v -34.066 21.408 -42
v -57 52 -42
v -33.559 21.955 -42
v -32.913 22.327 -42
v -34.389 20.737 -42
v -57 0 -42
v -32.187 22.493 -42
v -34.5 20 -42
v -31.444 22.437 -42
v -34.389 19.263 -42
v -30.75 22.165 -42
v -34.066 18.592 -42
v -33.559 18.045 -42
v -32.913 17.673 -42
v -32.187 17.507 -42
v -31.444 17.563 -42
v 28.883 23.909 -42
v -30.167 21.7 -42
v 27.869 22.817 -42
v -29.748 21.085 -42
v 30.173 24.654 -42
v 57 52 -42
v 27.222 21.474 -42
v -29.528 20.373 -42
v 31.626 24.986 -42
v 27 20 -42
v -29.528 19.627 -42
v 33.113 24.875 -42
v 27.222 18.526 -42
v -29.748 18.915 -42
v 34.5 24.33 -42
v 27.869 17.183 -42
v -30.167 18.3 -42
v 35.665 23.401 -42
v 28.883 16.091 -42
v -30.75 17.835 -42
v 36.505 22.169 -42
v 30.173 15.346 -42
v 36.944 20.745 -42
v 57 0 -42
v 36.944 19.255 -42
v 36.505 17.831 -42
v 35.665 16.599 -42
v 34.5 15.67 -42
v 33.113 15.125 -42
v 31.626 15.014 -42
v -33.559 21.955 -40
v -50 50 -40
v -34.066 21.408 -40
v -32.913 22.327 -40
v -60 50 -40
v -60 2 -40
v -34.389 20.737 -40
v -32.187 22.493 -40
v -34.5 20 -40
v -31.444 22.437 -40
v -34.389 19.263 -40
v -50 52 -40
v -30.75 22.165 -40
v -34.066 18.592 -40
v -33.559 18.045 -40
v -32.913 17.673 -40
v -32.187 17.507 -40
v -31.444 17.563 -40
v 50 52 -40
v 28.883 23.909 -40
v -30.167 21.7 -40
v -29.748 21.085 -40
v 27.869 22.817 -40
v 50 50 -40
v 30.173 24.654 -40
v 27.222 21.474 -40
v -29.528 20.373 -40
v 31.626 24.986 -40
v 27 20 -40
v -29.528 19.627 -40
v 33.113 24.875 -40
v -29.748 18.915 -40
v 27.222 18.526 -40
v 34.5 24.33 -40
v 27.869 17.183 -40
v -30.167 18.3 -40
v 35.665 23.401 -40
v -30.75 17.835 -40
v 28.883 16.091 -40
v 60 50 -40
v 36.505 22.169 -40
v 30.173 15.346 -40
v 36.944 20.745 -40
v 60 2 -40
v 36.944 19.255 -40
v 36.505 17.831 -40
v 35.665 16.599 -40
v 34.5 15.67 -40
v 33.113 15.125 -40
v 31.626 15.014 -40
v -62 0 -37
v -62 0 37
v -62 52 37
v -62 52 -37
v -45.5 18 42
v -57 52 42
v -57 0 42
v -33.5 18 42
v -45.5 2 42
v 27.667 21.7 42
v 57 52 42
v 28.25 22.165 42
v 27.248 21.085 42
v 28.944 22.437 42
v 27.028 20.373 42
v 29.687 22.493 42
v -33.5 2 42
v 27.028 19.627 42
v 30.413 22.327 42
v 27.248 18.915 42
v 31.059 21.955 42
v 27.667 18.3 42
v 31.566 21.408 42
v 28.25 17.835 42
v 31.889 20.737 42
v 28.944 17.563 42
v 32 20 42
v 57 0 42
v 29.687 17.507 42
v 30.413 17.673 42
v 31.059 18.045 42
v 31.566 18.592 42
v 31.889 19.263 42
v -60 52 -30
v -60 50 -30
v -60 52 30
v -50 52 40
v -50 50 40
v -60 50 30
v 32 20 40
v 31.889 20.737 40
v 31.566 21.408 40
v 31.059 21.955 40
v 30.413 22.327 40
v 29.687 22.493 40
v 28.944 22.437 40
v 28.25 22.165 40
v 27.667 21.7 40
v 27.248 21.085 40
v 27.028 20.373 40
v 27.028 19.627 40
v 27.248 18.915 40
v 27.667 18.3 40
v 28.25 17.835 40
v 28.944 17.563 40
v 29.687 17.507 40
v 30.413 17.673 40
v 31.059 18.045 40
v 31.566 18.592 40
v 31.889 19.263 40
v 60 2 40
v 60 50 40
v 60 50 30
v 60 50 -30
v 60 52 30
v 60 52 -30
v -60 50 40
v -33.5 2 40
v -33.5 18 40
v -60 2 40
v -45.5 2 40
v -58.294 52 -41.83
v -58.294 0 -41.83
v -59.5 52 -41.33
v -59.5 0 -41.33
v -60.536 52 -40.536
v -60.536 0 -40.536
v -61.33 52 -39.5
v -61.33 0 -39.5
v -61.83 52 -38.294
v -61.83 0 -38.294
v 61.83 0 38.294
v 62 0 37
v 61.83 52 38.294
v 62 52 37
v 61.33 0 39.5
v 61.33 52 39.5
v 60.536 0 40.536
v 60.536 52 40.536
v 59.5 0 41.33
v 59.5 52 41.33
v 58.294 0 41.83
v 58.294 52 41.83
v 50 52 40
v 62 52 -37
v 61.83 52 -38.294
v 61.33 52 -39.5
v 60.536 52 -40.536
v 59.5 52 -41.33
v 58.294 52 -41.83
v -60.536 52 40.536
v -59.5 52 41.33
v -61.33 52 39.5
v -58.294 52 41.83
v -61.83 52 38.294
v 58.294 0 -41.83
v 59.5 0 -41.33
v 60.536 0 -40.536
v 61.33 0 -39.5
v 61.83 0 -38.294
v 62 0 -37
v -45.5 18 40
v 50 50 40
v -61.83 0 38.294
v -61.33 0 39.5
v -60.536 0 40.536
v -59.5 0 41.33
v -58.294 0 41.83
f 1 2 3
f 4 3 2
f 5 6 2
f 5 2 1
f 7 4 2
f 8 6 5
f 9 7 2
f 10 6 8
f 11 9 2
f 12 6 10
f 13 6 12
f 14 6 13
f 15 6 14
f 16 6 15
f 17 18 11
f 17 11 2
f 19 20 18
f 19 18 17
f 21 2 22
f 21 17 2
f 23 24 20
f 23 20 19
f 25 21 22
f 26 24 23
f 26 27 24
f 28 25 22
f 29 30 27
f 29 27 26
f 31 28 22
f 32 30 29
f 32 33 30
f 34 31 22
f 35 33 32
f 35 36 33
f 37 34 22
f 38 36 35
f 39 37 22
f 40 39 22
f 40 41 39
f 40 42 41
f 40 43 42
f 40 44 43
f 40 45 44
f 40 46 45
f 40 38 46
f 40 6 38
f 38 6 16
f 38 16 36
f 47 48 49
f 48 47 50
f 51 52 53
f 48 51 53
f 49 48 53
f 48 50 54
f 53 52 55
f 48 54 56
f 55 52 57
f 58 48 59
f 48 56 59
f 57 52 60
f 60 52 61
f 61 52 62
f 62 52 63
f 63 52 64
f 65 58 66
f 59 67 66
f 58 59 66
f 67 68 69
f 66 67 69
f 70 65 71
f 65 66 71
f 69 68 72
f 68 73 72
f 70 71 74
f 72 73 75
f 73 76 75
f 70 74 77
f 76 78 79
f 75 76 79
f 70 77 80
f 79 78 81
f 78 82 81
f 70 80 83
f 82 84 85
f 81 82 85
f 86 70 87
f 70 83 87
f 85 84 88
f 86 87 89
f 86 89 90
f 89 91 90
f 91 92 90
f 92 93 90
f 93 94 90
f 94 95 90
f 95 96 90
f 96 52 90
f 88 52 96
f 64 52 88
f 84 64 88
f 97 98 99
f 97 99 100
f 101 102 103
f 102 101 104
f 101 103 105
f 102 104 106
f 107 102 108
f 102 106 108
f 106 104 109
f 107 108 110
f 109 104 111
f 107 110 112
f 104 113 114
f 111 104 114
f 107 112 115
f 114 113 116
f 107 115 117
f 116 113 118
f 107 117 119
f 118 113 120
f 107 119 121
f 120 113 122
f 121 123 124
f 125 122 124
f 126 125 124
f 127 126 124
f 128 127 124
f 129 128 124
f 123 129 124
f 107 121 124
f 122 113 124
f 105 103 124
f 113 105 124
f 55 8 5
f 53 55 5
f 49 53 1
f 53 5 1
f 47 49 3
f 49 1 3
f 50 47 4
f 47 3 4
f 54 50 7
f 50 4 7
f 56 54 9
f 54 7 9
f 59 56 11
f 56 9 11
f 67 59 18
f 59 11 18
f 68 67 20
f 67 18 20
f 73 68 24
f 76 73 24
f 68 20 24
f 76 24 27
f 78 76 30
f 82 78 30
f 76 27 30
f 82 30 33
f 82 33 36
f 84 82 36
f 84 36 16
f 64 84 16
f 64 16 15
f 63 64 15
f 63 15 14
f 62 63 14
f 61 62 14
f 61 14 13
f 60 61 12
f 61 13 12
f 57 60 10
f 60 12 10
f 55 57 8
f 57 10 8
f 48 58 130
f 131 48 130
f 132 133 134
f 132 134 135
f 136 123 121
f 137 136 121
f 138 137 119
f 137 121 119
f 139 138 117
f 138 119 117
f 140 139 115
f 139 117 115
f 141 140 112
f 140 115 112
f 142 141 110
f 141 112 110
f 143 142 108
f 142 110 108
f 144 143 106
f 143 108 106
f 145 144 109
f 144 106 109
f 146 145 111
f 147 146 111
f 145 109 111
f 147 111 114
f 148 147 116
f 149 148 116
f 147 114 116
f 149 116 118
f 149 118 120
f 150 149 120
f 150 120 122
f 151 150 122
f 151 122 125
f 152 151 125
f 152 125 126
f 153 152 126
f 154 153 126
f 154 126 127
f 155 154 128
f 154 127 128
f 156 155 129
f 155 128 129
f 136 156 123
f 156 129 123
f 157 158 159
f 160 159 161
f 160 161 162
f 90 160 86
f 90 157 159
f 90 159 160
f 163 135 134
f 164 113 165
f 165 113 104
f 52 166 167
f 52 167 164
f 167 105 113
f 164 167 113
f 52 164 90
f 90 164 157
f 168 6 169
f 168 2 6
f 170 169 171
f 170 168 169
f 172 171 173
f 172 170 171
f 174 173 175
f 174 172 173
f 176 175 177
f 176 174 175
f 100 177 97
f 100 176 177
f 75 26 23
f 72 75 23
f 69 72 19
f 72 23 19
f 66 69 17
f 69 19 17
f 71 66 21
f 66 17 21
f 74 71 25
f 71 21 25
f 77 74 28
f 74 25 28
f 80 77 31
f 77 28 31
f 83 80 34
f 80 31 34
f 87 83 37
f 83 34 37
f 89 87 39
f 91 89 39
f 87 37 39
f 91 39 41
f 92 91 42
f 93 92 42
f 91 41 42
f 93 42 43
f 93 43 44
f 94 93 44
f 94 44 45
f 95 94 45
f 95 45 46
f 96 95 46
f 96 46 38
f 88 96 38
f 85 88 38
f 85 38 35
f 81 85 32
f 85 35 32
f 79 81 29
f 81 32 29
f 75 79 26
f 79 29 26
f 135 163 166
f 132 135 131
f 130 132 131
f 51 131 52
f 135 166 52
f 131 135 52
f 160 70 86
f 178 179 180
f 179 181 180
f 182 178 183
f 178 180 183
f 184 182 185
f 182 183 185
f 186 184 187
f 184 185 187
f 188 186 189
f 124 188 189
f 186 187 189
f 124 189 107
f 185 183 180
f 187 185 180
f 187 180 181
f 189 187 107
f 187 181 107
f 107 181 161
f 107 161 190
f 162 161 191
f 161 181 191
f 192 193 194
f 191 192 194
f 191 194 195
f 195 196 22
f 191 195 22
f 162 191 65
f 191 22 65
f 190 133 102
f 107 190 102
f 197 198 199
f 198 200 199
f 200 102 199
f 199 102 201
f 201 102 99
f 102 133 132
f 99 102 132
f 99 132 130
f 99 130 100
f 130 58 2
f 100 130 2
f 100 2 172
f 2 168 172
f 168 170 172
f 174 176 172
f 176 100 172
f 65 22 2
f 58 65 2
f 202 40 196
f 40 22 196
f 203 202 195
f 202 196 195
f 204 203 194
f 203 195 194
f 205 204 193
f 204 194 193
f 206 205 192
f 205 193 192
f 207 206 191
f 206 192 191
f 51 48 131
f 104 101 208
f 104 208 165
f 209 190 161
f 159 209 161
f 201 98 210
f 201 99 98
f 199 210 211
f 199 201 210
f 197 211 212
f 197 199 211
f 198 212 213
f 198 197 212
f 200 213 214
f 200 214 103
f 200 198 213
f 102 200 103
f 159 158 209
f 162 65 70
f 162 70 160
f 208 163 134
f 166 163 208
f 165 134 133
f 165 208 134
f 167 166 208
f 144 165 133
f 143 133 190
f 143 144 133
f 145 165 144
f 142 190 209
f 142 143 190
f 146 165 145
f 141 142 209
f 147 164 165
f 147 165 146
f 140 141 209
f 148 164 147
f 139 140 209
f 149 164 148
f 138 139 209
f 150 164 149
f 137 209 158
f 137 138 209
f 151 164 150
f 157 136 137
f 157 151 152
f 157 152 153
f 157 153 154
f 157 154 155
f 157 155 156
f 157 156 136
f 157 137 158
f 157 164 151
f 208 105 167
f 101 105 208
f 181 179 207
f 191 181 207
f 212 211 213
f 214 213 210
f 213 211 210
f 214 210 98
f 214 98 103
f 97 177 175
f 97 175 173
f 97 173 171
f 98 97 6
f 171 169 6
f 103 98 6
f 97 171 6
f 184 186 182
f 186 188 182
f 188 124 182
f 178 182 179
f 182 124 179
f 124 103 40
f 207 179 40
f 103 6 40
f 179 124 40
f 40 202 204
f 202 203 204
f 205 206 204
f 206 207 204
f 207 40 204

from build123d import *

# Parameters (mm, degrees)
SKETCH1_W           = 120
SKETCH1_H           = 80
BOSS_EXTRUDE1_DEPTH = 2
SKETCH1_3_W         = 124
SKETCH1_3_H         = 84
SKETCH1_3_W_2       = 120
SKETCH1_3_H_2       = 80
BOSS_EXTRUDE2_DEPTH = 52
SKETCH2_W           = 12
SKETCH2_H           = 16
CUT_EXTRUDE1_DEPTH  = 2
SKETCH3_R           = 2.5
CUT_EXTRUDE3_DEPTH  = 2
SKETCH5_R           = 5
SKETCH5_R_2         = 2.5
CUT_EXTRUDE6_DEPTH  = 2
FILLET1_R           = 5
FILLET2_R           = 5
FILLET3_R           = 5
FILLET4_R           = 5
BOSS_EXTRUDE3_DEPTH = 2


with BuildPart() as part:
    # Sketch1 → Boss-Extrude1 (new body)
    with BuildSketch(Plane(origin=(0, 0, 0), x_dir=(1, 0, 0), z_dir=(0, 1, 0))):
        Rectangle(SKETCH1_W, SKETCH1_H)
    extrude(amount=BOSS_EXTRUDE1_DEPTH)

    # Sketch1<3> → Boss-Extrude2 (add)
    with BuildSketch(Plane(origin=(0, 0, 0), x_dir=(1, 0, 0), z_dir=(0, 1, 0))):
        Rectangle(SKETCH1_3_W, SKETCH1_3_H)
        Rectangle(SKETCH1_3_W_2, SKETCH1_3_H_2, mode=Mode.SUBTRACT)
    extrude(amount=BOSS_EXTRUDE2_DEPTH)

    # Sketch2 → Cut-Extrude1 (cut)
    with BuildSketch(Plane.XY.offset(42)):
        with Locations((-39.5, 10)):
            Rectangle(SKETCH2_W, SKETCH2_H)
    extrude(amount=-CUT_EXTRUDE1_DEPTH, mode=Mode.SUBTRACT)

    # Sketch3 → Cut-Extrude3 (cut)
    with BuildSketch(Plane.XY.offset(42)):
        with Locations((29.5, 20)):
            Circle(SKETCH3_R)
    extrude(amount=-CUT_EXTRUDE3_DEPTH, mode=Mode.SUBTRACT)

    # Sketch5 → Cut-Extrude6 (cut)
    with BuildSketch(Plane(origin=(0, 0, -42), x_dir=(-1, 0, 0), z_dir=(0, 0, -1))):
        with Locations((-32, 20)):
            Circle(SKETCH5_R)
        with Locations((32, 20)):
            Circle(SKETCH5_R_2)
    extrude(amount=-CUT_EXTRUDE6_DEPTH, mode=Mode.SUBTRACT)

    # Fillet1
    fillet1_edges = [part.edges().sort_by_distance(p)[0] for p in [
        (62, 26, -42),
    ]]
    fillet(fillet1_edges, radius=FILLET1_R)

    # Fillet2
    fillet2_edges = [part.edges().sort_by_distance(p)[0] for p in [
        (62, 26, 42),
    ]]
    fillet(fillet2_edges, radius=FILLET2_R)

    # Fillet3
    fillet3_edges = [part.edges().sort_by_distance(p)[0] for p in [
        (-62, 26, -42),
    ]]
    fillet(fillet3_edges, radius=FILLET3_R)

    # Fillet4
    fillet4_edges = [part.edges().sort_by_distance(p)[0] for p in [
        (-62, 26, 42),
    ]]
    fillet(fillet4_edges, radius=FILLET4_R)

    # Sketch6 → Boss-Extrude3 (add)
    with BuildSketch(Plane(origin=(0, 52, 0), x_dir=(1, 0, 0), z_dir=(0, 1, 0))):
        Polygon((-50, 40), (-60, 30), (-60, 40), align=None)
        Polygon((-60, -30), (-60, -40), (-50, -40), align=None)
        Polygon((50, -40), (60, -30), (60, -40), align=None)
        Polygon((60, 30), (60, 40), (50, 40), align=None)
    extrude(amount=-BOSS_EXTRUDE3_DEPTH)


solid = part.part
